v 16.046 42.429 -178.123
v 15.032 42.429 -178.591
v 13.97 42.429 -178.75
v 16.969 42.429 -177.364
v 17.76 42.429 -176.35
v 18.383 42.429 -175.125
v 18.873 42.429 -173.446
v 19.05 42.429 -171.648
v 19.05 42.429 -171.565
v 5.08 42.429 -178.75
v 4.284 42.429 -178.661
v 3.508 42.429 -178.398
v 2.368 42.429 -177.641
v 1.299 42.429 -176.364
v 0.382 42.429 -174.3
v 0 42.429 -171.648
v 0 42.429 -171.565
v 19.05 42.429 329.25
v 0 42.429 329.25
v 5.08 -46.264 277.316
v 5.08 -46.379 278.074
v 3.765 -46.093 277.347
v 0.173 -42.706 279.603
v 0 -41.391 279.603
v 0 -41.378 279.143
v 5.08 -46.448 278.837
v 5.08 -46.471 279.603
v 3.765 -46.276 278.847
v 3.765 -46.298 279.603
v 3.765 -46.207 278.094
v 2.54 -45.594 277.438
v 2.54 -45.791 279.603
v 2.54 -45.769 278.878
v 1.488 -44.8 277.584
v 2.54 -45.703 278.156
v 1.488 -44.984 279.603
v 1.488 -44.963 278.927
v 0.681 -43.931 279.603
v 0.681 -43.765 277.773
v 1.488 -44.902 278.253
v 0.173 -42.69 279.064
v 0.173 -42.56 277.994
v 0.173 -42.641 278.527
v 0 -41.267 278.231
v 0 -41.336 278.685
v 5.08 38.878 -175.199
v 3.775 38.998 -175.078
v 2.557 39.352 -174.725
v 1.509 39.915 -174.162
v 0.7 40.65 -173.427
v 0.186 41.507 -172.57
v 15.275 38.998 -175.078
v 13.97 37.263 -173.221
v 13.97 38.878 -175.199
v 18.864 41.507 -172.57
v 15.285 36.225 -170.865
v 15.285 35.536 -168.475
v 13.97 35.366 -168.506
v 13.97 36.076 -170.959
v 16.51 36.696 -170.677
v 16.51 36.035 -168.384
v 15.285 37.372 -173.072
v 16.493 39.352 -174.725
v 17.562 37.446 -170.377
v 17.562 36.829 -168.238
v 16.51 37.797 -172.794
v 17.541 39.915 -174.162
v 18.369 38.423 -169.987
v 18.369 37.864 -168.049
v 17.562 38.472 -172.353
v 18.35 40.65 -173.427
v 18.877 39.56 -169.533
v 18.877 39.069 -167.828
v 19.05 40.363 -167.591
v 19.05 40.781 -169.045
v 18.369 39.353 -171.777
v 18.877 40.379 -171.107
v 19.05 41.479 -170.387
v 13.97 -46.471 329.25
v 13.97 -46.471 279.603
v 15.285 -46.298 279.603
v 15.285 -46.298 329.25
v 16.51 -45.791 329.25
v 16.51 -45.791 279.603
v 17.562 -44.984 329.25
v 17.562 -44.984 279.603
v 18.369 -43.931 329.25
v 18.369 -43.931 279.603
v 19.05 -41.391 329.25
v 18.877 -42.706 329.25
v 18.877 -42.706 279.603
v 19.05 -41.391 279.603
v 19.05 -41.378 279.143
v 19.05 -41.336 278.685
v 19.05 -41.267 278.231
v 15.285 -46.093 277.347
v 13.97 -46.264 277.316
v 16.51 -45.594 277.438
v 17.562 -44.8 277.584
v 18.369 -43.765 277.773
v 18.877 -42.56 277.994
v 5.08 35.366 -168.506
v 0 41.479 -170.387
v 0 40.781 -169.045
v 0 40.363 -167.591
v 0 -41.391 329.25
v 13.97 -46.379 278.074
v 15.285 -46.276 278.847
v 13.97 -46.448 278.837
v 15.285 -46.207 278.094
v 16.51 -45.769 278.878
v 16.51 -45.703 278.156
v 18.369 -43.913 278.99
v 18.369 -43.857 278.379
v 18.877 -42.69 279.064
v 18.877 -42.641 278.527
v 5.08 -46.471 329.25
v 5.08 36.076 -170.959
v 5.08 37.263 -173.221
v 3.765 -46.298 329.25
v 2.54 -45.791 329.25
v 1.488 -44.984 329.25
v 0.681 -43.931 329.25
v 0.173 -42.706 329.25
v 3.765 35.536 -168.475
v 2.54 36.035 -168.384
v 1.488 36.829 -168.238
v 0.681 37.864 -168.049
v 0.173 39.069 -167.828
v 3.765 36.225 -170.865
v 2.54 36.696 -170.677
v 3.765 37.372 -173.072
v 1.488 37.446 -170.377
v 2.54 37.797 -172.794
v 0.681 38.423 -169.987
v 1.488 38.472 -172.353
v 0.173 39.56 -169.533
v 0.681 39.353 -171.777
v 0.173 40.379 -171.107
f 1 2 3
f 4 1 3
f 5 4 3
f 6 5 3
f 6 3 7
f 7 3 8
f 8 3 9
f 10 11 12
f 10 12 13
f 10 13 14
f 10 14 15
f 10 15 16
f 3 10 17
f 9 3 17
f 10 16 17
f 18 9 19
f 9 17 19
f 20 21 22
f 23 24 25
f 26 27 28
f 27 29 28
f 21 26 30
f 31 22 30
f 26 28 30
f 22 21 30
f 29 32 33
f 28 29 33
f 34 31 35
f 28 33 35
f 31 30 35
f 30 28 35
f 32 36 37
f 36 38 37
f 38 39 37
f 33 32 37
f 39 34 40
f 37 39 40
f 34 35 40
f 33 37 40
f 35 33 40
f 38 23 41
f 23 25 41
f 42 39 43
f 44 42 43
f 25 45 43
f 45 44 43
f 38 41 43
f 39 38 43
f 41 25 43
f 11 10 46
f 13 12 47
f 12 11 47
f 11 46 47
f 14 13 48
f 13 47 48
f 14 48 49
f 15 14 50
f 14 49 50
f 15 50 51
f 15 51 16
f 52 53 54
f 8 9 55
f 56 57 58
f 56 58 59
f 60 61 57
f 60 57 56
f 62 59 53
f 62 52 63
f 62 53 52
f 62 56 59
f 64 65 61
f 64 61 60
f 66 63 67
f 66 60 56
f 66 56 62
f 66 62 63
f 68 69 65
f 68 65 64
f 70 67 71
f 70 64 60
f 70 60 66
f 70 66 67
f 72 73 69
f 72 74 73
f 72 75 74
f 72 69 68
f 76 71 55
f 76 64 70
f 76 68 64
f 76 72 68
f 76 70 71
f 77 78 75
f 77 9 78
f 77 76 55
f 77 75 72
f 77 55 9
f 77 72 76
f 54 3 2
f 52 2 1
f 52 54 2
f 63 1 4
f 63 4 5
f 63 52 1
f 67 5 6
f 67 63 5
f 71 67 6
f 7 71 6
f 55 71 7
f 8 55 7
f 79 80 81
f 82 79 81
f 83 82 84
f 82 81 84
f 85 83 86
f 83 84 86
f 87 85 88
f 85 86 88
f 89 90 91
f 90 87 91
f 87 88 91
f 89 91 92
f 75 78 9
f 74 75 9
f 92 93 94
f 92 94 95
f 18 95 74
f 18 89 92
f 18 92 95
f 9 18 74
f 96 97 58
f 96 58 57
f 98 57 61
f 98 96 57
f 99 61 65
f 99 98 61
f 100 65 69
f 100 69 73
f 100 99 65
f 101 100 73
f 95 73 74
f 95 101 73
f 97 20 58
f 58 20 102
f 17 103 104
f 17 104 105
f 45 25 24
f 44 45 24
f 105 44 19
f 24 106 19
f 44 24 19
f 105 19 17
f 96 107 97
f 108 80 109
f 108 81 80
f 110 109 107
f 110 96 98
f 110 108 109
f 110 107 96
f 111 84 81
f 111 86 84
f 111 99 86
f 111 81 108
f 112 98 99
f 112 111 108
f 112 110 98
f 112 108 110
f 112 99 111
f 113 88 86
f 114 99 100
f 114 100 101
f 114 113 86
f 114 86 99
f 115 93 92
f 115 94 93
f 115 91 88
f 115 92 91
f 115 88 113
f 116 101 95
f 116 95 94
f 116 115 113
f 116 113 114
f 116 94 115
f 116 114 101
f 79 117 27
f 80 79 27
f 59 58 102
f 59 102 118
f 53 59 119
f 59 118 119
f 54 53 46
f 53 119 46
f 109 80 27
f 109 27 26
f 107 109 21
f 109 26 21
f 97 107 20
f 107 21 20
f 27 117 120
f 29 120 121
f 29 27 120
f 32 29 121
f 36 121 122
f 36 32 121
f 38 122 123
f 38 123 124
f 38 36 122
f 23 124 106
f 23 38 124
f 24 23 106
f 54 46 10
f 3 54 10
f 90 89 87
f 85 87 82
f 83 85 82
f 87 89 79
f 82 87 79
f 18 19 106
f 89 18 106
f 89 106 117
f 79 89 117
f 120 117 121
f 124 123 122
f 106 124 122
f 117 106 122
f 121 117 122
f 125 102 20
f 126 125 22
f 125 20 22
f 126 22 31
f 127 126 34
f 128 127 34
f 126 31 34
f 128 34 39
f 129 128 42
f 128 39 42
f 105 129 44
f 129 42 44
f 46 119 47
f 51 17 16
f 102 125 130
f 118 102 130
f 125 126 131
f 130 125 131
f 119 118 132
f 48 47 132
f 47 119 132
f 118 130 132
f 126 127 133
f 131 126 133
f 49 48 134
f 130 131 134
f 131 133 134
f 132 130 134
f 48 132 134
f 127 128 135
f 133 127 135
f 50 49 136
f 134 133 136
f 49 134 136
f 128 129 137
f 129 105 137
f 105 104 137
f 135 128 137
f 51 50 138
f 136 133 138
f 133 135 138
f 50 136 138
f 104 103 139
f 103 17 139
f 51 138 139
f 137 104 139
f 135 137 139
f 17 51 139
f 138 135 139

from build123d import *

# Parameters (mm, degrees)
F1_DEPTH     = 19.05
F2_T1_DEPTH  = 453.2334559577
F2_T3_DEPTH  = 17.7217096423
F2_T5_DEPTH  = 62.3469086479
F2_T8_ANGLE  = 10.3758449201
F2_T10_ANGLE = 34.6241550799
F2_T12_ANGLE = 10.3758449201
F2_T14_ANGLE = 34.6241550799


# Not quite as in the source:
# - a fillet or chamfer that OpenCascade refuses, or shapes differently, is made with other operations: its cross-section is extruded or revolved along the edge and cut away or added


with BuildPart() as f1:
    # F0 (on Right) → F1 (new body)
    with BuildSketch(Plane.YZ):
        with BuildLine():
            Line((42.4285726043, -178.7500022879), (42.4285726043, 329.2499977121))
            Line((42.4285726043, 329.2499977121), (-46.4714273957, 329.2499977121))
            Line((-46.4714273957, 329.2499977121), (-46.4714273957, 279.6030890642))
            ThreePointArc((-46.4714273957, 279.6030890642), (-46.4194016068, 278.4547213725), (-46.2637504894, 277.3157623006))
            Line((-46.2637504894, 277.3157623006), (35.3656206904, -168.5061879892))
            ThreePointArc((35.3656206904, -168.5061879892), (36.6122005726, -172.1199848152), (38.877687663, -175.1991173466))
            Line((38.877687663, -175.1991173466), (42.4285726043, -178.7500022879))
        make_face()
    extrude(amount=F1_DEPTH)

    # F2: fillet of radius 5.08 on 2 edges, made by hand

    # F2_s2 → F2_t1 (cut)
    with BuildSketch(Plane(origin=(0, -50.6297547862, 276.5163530631), x_dir=(1, 0, 0), z_dir=(0, 0.1801044696, -0.9836474877))):
        with BuildLine():
            ThreePointArc((13.97, -4.4385863345), (17.5621024484, -5.9264838861), (19.05, -9.5185863345))
            Line((19.05, -9.5185863345), (19.05, -4.4385863345))
            Line((19.05, -4.4385863345), (13.97, -4.4385863345))
        make_face()
        with BuildLine():
            ThreePointArc((5.08, -4.4385863345), (1.4878975516, -5.9264838861), (0, -9.5185863345))
            Line((0, -9.5185863345), (0, -4.4385863345))
            Line((0, -4.4385863345), (5.08, -4.4385863345))
        make_face()
    extrude(amount=F2_T1_DEPTH, mode=Mode.SUBTRACT)

    # F2_s4 → F2_t3 (cut)
    with BuildSketch(Plane(origin=(0, 107.0384025048, -107.0384025048), x_dir=(1, 0, 0), z_dir=(0, 0.7071067812, -0.7071067812))):
        with BuildLine():
            ThreePointArc((5.08, 96.3938073503), (1.4878975516, 94.9059097987), (0, 91.3138073503))
            Line((0, 91.3138073503), (0, 96.3938073503))
            Line((0, 96.3938073503), (5.08, 96.3938073503))
        make_face()
        with BuildLine():
            ThreePointArc((13.97, 96.3938073503), (17.5621024484, 94.9059097987), (19.05, 91.3138073503))
            Line((19.05, 91.3138073503), (19.05, 96.3938073503))
            Line((19.05, 96.3938073503), (13.97, 96.3938073503))
        make_face()
    extrude(amount=F2_T3_DEPTH, mode=Mode.SUBTRACT)

    # F2_s6 → F2_t5 (cut)
    with BuildSketch(Plane.XY.offset(279.6030890642)):
        with BuildLine():
            ThreePointArc((5.08, -46.4714273957), (1.4878975516, -44.9835298442), (0, -41.3914273957))
            Line((0, -41.3914273957), (0, -46.4714273957))
            Line((0, -46.4714273957), (5.08, -46.4714273957))
        make_face()
        with BuildLine():
            ThreePointArc((13.97, -46.4714273957), (17.5621024484, -44.9835298442), (19.05, -41.3914273957))
            Line((19.05, -41.3914273957), (19.05, -46.4714273957))
            Line((19.05, -46.4714273957), (13.97, -46.4714273957))
        make_face()
    extrude(amount=F2_T5_DEPTH, mode=Mode.SUBTRACT)

    # F2_s7 → F2_t8 (revolve, cut)
    with BuildSketch(Plane.XY.offset(279.6030890642)):
        with BuildLine():
            ThreePointArc((5.08, -46.4714273957), (1.4878975516, -44.9835298442), (0, -41.3914273957))
            Line((0, -41.3914273957), (0, -46.4714273957))
            Line((0, -46.4714273957), (5.08, -46.4714273957))
        make_face()
    revolve(axis=Axis((0, -33.7714273957, 279.6030890642), (1, 0, 0)), revolution_arc=F2_T8_ANGLE, mode=Mode.SUBTRACT)

    # F2_s9 → F2_t10 (revolve, cut)
    with BuildSketch(Plane(origin=(0, 30.9996163936, -169.3055972266), x_dir=(1, 0, 0), z_dir=(0, -0.1801044696, 0.9836474877))):
        with BuildLine():
            ThreePointArc((5.08, 4.4385863345), (1.4878975516, 5.9264838861), (0, 9.5185863345))
            Line((0, 9.5185863345), (0, 4.4385863345))
            Line((0, 4.4385863345), (5.08, 4.4385863345))
        make_face()
    revolve(axis=Axis((0, 47.8579437841, -166.2188612255), (1, 0, 0)), revolution_arc=F2_T10_ANGLE, mode=Mode.SUBTRACT)

    # F2_s11 → F2_t12 (revolve, cut)
    with BuildSketch(Plane.XY.offset(279.6030890642)):
        with BuildLine():
            ThreePointArc((13.97, -46.4714273957), (17.5621024484, -44.9835298442), (19.05, -41.3914273957))
            Line((19.05, -41.3914273957), (19.05, -46.4714273957))
            Line((19.05, -46.4714273957), (13.97, -46.4714273957))
        make_face()
    revolve(axis=Axis((19.05, -33.7714273957, 279.6030890642), (1, 0, 0)), revolution_arc=F2_T12_ANGLE, mode=Mode.SUBTRACT)

    # F2_s13 → F2_t14 (revolve, cut)
    with BuildSketch(Plane(origin=(0, 30.9996163936, -169.3055972266), x_dir=(1, 0, 0), z_dir=(0, -0.1801044696, 0.9836474877))):
        with BuildLine():
            ThreePointArc((13.97, 4.4385863345), (17.5621024484, 5.9264838861), (19.05, 9.5185863345))
            Line((19.05, 9.5185863345), (19.05, 4.4385863345))
            Line((19.05, 4.4385863345), (13.97, 4.4385863345))
        make_face()
    revolve(axis=Axis((19.05, 47.8579437841, -166.2188612255), (1, 0, 0)), revolution_arc=F2_T14_ANGLE, mode=Mode.SUBTRACT)


solid = f1.part
